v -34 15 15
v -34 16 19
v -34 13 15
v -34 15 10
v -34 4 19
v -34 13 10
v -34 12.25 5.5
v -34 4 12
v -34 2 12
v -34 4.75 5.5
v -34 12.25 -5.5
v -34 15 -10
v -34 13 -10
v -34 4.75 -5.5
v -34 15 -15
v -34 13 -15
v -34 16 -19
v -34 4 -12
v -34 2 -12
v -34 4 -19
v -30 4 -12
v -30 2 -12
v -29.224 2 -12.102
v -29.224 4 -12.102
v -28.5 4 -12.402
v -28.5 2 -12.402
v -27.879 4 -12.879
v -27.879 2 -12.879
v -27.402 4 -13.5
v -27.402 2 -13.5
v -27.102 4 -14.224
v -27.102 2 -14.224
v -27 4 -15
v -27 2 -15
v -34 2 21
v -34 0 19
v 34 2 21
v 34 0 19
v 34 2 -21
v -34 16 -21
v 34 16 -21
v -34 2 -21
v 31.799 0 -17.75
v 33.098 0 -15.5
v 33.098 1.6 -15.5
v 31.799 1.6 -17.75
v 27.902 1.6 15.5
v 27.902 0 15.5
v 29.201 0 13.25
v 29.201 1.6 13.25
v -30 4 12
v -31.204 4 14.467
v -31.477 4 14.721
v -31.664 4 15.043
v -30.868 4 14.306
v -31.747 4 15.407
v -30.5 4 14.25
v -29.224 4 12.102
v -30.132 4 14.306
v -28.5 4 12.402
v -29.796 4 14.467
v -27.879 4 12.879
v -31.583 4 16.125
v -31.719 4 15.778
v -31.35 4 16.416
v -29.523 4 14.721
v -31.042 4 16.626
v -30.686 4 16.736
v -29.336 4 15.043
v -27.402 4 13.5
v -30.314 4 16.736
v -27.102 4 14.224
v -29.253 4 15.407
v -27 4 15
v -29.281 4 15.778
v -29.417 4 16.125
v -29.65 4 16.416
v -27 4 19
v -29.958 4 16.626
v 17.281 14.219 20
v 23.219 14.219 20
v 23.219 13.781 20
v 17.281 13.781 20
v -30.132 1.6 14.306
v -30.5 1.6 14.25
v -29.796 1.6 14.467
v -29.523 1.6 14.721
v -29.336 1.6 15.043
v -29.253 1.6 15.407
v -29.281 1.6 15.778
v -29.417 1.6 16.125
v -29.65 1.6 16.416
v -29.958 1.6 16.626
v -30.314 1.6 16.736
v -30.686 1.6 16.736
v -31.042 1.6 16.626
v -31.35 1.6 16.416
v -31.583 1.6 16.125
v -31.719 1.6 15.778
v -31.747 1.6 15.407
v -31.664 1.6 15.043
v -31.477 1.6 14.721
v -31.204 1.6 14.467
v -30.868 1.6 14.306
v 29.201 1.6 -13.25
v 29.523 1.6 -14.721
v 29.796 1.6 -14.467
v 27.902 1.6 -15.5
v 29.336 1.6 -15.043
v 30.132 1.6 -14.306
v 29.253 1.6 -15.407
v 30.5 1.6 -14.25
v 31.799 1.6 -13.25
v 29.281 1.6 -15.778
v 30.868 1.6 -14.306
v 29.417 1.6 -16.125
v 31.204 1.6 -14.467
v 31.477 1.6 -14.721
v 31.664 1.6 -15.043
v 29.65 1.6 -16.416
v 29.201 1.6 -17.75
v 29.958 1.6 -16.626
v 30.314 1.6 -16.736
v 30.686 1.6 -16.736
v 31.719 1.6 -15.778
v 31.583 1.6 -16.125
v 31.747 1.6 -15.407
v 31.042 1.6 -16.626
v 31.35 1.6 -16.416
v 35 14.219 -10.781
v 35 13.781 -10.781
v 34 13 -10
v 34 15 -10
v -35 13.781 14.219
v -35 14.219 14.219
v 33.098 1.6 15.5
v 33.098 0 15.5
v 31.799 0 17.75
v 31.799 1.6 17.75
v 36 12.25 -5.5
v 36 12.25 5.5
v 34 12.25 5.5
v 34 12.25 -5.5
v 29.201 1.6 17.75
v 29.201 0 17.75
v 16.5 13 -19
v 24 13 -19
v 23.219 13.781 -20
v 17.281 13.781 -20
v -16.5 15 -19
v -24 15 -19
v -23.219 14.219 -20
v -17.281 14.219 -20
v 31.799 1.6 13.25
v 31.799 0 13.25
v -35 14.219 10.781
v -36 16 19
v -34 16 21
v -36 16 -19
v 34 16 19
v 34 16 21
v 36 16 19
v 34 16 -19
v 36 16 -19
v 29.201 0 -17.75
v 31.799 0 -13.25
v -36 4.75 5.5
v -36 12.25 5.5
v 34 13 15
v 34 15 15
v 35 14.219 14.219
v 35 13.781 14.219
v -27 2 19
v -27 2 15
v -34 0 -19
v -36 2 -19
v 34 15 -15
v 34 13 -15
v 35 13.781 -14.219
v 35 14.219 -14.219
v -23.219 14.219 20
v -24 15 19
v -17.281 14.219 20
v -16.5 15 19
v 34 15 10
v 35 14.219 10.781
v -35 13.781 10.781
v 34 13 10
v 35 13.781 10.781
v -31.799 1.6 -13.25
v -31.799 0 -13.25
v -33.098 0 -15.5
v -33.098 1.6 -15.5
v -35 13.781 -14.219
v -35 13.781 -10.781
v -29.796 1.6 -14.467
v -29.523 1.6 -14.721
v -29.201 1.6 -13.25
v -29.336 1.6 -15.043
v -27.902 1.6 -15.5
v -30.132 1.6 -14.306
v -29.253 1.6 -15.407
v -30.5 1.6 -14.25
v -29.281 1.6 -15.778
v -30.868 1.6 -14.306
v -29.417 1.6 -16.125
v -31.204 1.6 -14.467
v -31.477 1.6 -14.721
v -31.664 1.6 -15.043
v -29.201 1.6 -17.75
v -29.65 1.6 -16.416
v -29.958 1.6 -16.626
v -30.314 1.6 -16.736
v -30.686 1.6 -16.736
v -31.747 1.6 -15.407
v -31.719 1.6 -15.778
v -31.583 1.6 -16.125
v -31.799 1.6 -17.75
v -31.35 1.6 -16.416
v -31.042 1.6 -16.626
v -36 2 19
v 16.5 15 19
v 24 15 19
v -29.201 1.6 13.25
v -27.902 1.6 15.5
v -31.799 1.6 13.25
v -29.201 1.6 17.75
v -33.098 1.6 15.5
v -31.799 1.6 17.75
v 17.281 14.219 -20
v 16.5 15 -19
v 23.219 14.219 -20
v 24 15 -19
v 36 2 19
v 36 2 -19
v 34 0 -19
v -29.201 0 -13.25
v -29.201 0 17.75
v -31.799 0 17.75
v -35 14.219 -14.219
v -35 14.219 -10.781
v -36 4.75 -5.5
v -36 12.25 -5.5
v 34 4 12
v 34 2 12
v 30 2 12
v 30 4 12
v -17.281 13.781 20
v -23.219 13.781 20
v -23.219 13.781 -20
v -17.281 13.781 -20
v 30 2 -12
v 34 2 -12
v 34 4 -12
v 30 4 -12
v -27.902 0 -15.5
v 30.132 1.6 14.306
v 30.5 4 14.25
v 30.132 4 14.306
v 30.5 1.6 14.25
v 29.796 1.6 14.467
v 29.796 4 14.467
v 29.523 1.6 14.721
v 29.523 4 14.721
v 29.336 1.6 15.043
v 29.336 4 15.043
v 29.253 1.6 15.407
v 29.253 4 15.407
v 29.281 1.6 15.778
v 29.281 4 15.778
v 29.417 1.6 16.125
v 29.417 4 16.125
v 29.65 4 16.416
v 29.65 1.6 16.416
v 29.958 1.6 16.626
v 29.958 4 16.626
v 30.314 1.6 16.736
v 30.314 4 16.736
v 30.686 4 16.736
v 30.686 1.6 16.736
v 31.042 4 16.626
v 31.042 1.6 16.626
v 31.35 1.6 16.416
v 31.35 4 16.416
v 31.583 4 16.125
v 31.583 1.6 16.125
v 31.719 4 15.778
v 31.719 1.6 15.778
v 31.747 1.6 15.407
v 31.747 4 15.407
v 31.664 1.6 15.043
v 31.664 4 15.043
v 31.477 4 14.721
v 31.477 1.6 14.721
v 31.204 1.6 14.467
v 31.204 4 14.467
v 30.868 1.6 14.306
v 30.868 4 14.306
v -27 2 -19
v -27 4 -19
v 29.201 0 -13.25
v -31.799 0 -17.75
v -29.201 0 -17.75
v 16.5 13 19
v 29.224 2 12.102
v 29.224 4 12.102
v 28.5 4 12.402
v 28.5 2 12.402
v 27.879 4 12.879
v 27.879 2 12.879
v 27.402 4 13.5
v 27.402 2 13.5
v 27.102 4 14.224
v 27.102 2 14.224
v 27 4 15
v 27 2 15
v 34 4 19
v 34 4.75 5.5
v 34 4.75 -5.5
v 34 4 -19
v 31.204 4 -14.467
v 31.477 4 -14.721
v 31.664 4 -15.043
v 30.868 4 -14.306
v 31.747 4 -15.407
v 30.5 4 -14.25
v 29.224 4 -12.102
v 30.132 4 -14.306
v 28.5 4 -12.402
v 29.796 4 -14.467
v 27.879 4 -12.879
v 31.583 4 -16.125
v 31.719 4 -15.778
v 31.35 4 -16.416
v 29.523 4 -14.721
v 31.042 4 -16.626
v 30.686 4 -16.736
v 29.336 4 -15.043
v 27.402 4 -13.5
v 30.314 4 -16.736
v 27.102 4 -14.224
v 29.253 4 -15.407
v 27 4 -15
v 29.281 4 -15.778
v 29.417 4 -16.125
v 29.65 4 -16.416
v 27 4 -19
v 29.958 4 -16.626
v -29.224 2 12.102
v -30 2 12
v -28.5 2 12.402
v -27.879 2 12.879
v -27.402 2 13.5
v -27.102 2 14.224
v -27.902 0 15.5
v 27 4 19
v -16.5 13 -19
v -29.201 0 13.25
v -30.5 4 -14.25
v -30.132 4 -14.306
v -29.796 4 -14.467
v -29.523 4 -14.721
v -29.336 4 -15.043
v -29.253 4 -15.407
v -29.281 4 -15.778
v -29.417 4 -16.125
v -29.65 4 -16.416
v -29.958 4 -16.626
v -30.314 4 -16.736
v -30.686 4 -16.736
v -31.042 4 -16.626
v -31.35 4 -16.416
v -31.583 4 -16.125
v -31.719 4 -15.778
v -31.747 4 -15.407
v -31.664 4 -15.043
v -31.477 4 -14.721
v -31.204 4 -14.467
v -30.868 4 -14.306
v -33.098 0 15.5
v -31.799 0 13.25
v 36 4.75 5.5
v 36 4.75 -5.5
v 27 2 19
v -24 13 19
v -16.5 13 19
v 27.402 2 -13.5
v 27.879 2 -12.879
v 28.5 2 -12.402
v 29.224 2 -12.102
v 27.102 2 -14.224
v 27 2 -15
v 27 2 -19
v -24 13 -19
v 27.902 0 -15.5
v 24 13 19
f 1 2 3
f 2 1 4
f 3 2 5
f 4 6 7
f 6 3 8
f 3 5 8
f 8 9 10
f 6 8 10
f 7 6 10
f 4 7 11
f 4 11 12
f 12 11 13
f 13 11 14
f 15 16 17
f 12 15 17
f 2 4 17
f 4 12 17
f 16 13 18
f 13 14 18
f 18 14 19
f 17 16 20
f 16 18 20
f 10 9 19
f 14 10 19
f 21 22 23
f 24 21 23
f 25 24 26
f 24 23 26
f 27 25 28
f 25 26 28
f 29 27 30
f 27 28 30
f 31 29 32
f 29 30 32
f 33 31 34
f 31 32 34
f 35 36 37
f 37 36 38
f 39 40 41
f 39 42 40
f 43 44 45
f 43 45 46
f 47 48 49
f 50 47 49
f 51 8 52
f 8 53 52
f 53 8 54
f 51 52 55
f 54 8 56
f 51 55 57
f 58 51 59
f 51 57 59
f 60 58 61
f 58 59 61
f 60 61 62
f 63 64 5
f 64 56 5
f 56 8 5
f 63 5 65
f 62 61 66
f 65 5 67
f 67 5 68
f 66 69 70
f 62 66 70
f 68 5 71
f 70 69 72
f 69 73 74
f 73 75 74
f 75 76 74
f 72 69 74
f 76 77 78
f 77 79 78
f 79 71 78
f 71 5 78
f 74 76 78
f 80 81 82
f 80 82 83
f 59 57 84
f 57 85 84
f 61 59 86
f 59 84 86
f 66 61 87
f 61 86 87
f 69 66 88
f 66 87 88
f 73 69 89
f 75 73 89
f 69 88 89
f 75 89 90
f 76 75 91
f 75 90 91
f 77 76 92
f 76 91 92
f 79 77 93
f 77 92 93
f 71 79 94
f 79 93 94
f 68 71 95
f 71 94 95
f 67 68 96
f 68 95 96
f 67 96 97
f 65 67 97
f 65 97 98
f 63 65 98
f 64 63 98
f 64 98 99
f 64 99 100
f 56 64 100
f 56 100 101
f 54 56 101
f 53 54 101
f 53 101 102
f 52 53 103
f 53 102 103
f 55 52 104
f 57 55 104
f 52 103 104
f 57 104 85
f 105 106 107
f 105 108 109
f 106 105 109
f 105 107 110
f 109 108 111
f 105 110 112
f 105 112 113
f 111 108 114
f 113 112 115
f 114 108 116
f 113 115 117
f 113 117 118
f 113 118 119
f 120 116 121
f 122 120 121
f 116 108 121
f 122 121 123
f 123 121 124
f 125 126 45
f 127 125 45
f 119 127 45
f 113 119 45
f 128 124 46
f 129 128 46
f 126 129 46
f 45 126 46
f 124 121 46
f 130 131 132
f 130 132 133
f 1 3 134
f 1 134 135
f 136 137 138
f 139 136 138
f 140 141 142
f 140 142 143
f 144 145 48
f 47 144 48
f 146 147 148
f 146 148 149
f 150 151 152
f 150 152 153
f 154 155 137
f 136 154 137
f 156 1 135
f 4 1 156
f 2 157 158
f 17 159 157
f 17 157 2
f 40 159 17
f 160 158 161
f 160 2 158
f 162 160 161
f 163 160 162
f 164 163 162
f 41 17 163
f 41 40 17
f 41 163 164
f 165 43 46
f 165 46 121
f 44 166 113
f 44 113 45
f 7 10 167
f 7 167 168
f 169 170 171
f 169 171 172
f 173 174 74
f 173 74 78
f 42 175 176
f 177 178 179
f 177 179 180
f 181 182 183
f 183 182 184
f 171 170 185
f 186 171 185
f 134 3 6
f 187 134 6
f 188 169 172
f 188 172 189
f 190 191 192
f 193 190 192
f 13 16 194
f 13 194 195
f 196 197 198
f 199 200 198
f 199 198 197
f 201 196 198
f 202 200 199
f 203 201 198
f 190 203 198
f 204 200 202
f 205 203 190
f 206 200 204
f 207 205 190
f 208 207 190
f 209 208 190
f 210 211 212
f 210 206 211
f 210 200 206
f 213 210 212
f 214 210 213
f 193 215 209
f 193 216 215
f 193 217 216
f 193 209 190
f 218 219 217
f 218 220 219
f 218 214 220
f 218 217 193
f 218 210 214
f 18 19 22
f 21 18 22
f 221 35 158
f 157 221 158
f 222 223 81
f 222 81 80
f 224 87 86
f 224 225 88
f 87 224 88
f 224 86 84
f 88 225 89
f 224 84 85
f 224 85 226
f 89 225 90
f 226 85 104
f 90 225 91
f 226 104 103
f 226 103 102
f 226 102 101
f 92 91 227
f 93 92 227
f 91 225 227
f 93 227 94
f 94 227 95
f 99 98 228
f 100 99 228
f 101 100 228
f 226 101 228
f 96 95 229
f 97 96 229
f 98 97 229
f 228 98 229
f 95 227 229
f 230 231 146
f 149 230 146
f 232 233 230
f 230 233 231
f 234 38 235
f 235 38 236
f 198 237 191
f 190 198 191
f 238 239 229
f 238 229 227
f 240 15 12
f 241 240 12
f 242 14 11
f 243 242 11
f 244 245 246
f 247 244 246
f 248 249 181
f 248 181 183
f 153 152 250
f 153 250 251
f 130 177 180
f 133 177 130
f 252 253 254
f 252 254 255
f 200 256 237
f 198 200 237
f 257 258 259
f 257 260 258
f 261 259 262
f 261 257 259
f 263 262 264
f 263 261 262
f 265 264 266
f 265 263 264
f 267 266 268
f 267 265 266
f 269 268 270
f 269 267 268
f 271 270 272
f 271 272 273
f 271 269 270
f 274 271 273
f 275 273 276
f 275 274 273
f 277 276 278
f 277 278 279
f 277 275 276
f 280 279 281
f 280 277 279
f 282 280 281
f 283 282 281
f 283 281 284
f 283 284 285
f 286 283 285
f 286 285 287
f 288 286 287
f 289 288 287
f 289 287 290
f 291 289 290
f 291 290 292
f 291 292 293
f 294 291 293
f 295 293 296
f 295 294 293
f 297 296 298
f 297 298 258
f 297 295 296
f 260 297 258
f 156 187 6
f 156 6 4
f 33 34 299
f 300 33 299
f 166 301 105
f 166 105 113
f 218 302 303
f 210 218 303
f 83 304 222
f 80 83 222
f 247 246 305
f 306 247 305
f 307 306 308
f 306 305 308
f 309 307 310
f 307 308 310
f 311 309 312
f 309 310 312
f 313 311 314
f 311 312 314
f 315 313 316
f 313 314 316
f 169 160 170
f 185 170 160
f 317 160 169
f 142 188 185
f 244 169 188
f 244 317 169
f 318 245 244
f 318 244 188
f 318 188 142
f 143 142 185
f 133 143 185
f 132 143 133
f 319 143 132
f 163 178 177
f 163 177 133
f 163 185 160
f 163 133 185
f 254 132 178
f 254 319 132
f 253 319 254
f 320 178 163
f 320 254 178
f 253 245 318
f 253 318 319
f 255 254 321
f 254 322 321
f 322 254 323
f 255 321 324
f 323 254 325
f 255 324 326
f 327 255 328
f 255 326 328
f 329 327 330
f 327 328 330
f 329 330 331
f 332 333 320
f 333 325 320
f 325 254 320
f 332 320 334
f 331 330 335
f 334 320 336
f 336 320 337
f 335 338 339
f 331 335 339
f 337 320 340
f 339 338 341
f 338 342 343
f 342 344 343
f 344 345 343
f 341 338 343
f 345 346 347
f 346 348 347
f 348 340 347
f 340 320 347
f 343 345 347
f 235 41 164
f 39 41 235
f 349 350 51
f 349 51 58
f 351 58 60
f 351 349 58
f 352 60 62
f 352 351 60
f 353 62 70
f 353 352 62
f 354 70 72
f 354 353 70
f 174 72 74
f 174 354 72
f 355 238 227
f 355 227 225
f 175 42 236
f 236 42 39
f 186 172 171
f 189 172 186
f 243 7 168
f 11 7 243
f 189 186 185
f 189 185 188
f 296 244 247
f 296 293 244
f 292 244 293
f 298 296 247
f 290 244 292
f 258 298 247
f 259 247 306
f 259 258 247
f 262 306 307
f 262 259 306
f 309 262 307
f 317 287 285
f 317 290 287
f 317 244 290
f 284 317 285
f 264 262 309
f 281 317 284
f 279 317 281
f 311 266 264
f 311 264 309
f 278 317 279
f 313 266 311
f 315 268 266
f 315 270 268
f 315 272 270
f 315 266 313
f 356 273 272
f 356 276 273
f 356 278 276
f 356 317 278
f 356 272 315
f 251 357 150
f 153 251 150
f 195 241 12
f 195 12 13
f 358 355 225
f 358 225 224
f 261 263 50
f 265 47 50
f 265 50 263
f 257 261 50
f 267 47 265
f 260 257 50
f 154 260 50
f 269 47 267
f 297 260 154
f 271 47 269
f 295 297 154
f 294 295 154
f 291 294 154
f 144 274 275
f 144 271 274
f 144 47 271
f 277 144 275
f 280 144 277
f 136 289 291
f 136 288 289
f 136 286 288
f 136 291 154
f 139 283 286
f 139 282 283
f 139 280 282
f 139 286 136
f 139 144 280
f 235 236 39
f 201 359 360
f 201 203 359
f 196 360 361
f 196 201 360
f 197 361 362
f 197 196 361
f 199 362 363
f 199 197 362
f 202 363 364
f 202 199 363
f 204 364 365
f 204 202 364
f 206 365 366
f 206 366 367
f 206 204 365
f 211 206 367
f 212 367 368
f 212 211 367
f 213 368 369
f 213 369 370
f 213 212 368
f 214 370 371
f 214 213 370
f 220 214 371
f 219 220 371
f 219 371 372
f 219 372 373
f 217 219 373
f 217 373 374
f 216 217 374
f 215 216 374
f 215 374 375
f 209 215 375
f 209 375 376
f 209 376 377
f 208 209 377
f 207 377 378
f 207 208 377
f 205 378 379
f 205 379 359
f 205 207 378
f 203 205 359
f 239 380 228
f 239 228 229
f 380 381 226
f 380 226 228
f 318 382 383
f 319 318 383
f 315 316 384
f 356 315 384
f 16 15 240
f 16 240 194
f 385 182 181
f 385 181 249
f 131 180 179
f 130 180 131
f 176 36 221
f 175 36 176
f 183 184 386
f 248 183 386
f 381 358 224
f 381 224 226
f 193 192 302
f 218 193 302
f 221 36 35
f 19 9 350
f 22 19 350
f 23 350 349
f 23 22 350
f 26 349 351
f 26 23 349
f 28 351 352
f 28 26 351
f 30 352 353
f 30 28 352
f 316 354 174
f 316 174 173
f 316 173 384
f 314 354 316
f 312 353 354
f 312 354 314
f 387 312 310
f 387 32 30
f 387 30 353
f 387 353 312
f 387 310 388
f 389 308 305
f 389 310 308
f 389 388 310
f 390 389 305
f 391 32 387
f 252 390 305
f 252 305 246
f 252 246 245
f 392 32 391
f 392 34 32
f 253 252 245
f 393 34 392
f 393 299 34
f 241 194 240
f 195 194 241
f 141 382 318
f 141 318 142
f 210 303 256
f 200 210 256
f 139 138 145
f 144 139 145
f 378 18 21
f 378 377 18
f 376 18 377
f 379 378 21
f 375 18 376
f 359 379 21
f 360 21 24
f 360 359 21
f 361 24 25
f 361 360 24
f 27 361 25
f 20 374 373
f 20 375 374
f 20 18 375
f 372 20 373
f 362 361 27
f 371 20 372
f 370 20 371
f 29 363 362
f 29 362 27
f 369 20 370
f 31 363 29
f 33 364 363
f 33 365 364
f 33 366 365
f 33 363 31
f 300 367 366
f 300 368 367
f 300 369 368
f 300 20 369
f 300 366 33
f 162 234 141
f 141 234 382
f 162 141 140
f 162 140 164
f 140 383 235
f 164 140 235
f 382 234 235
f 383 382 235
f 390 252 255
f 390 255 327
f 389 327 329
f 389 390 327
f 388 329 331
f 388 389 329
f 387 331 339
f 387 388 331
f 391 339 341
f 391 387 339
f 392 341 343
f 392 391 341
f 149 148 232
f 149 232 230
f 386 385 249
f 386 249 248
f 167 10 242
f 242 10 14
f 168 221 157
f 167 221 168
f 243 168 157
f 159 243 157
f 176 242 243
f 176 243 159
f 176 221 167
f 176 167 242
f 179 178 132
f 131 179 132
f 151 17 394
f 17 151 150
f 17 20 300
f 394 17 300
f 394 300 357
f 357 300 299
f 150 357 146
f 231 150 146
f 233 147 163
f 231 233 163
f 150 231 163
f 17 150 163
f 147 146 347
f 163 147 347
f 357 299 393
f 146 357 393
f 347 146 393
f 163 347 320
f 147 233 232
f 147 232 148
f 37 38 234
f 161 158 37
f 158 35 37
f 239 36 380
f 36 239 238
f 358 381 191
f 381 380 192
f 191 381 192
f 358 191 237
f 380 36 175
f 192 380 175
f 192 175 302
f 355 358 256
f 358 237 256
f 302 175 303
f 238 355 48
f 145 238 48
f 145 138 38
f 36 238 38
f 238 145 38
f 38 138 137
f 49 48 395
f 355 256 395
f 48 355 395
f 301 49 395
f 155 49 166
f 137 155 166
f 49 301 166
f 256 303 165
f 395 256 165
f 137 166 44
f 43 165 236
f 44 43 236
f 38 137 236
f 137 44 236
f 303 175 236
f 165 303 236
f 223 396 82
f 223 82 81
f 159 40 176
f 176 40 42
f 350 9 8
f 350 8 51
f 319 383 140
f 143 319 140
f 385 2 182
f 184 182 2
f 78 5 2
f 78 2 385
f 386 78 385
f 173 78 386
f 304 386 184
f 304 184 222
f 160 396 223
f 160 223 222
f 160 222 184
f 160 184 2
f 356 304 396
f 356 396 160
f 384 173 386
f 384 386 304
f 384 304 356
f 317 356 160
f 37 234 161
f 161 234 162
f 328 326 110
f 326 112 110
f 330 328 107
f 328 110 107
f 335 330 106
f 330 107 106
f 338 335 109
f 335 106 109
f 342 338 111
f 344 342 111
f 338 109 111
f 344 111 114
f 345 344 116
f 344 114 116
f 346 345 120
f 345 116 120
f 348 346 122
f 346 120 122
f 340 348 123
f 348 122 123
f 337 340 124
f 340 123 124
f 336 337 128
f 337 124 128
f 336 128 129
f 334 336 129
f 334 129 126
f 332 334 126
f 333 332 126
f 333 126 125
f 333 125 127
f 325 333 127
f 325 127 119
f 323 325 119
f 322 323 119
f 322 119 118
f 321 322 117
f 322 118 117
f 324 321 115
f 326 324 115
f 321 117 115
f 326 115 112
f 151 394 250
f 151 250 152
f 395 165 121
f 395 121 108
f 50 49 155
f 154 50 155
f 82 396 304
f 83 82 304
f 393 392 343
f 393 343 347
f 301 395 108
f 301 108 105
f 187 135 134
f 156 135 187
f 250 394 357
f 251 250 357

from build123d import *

# Parameters (mm, degrees)
SKETCH1_W               = 72
SKETCH1_H               = 42
SKETCH1_W_2             = 68
SKETCH1_H_2             = 38
BOSS_EXTRUDE1_DEPTH     = 2
BOSS_EXTRUDE2_START     = 2
SKETCH1_3_W             = 72
SKETCH1_3_H             = 42
SKETCH1_3_W_2           = 68
SKETCH1_3_H_2           = 38
BOSS_EXTRUDE2_DEPTH     = 14
CHAMFER1_SIZE           = 2
SKETCH2_R               = 1.25
BOSS_EXTRUDE3_DEPTH     = 2
MIRROR2_COPY_1_SKETCH_R = 1.25
MIRROR2_COPY_1_DEPTH    = 2
CUT_EXTRUDE1_DEPTH      = 1.6
MIRROR4_COPY_1_DEPTH    = 1.6
CUT_EXTRUDE2_DEPTH      = 44.965895874
CUT_EXTRUDE2_DEPTH_BACK = 44.965895874
SKETCH4_R               = 1.25
SKETCH5_W               = 7.5
SKETCH5_H               = 2
CUT_EXTRUDE3_DEPTH      = 1
CUT_EXTRUDE3_DRAFT      = -38
MIRROR5_COPY_1_SKETCH_W = 7.5
MIRROR5_COPY_1_SKETCH_H = 2
MIRROR5_COPY_1_DEPTH    = 1
MIRROR5_COPY_1_DRAFT    = -38
MIRROR8_COPY_1_SKETCH_W = 7.5
MIRROR8_COPY_1_SKETCH_H = 2
MIRROR8_COPY_1_DEPTH    = 1
MIRROR8_COPY_1_DRAFT    = -38
MIRROR8_COPY_2_SKETCH_W = 7.5
MIRROR8_COPY_2_SKETCH_H = 2
MIRROR8_COPY_2_DEPTH    = 1
MIRROR8_COPY_2_DRAFT    = -38
SKETCH6_W               = 5
SKETCH6_H               = 2
CUT_EXTRUDE4_DEPTH      = 1
CUT_EXTRUDE4_DRAFT      = -38
MIRROR6_COPY_1_SKETCH_W = 5
MIRROR6_COPY_1_SKETCH_H = 2
MIRROR6_COPY_1_DEPTH    = 1
MIRROR6_COPY_1_DRAFT    = -38
MIRROR7_COPY_1_SKETCH_W = 5
MIRROR7_COPY_1_SKETCH_H = 2
MIRROR7_COPY_1_DEPTH    = 1
MIRROR7_COPY_1_DRAFT    = -38
MIRROR7_COPY_2_SKETCH_W = 5
MIRROR7_COPY_2_SKETCH_H = 2
MIRROR7_COPY_2_DEPTH    = 1
MIRROR7_COPY_2_DRAFT    = -38
SKETCH7_W               = 11
SKETCH7_H               = 7.5
CUT_EXTRUDE5_DEPTH      = 77.68767828


with BuildPart() as part:
    # Sketch1 → Boss-Extrude1 (new body)
    # profile 1 of 2: a face of its own
    with BuildSketch(Plane(origin=(0, 0, 0), x_dir=(1, 0, 0), z_dir=(0, 1, 0))):
        Rectangle(SKETCH1_W, SKETCH1_H)
        Rectangle(SKETCH1_W_2, SKETCH1_H_2, mode=Mode.SUBTRACT)
    # profile 2 of 2: a face of its own
    with BuildSketch(Plane(origin=(0, 0, 0), x_dir=(1, 0, 0), z_dir=(0, 1, 0))):
        Rectangle(SKETCH1_W_2, SKETCH1_H_2)
    extrude(amount=BOSS_EXTRUDE1_DEPTH)

    # Sketch1<3> → Boss-Extrude2 (add)
    with BuildSketch(Plane(origin=(0, 0, 0), x_dir=(1, 0, 0), z_dir=(0, 1, 0)).offset(BOSS_EXTRUDE2_START)):
        Rectangle(SKETCH1_3_W, SKETCH1_3_H)
        Rectangle(SKETCH1_3_W_2, SKETCH1_3_H_2, mode=Mode.SUBTRACT)
    extrude(amount=BOSS_EXTRUDE2_DEPTH)

    # Chamfer1
    chamfer1_edges = [part.edges().sort_by_distance(p)[0] for p in [
        (0, 0, -21),
        (36, 0, 0),
        (0, 0, 21),
        (-36, 0, 0),
        (-36, 8, -21),
        (36, 8, -21),
        (36, 8, 21),
        (-36, 8, 21),
    ]]
    chamfer(chamfer1_edges, length=CHAMFER1_SIZE)

    # Sketch2 → Boss-Extrude3 (add)
    with BuildSketch(Plane(origin=(0, 2, 0), x_dir=(1, 0, 0), z_dir=(0, 1, 0))):
        with BuildLine():
            Line((-34, 12), (-30, 12))
            ThreePointArc((-30, 12), (-27.878679656, 12.878679656), (-27, 15))
            Line((-27, 15), (-27, 19))
            Line((-27, 19), (-34, 19))
            Line((-34, 19), (-34, 12))
        make_face()
        with Locations(Location((-30.5, 15.5, 0), (0, 0, 270))):
            Circle(SKETCH2_R, mode=Mode.SUBTRACT)
    boss_extrude3 = extrude(amount=BOSS_EXTRUDE3_DEPTH)

    # Mirror1: Boss-Extrude3 across plane
    add(boss_extrude3.mirror(Plane.XY))

    # Mirror2: Boss-Extrude3 across plane
    add(boss_extrude3.mirror(Plane(origin=(0, 0, 0), x_dir=(0, 0, 1), z_dir=(1, 0, 0))))

    # Mirror2 copy 1 sketch → Mirror2 copy 1 (add)
    with BuildSketch(Plane(origin=(0, 2, 0), x_dir=(-1, 0, 0), z_dir=(0, 1, 0))):
        with BuildLine():
            Line((-34, 12), (-30, 12))
            ThreePointArc((-30, 12), (-27.878679656, 12.878679656), (-27, 15))
            Line((-27, 15), (-27, 19))
            Line((-27, 19), (-34, 19))
            Line((-34, 19), (-34, 12))
        make_face()
        with Locations(Location((-30.5, 15.5, 0), (0, 0, 270))):
            Circle(MIRROR2_COPY_1_SKETCH_R, mode=Mode.SUBTRACT)
    extrude(amount=MIRROR2_COPY_1_DEPTH)

    # Sketch3 → Cut-Extrude1 (cut)
    with BuildSketch(Plane.XZ):
        Polygon((-31.799038106, 17.75), (-29.200961894, 17.75), (-27.901923789, 15.5), (-29.200961894, 13.25), (-31.799038106, 13.25), (-33.098076211, 15.5), align=None)
    cut_extrude1 = extrude(amount=-CUT_EXTRUDE1_DEPTH, mode=Mode.SUBTRACT)

    # Mirror3: Cut-Extrude1 across plane
    add(cut_extrude1.mirror(Plane.XY), mode=Mode.SUBTRACT)

    # Mirror4: Cut-Extrude1 across plane
    add(cut_extrude1.mirror(Plane(origin=(0, 0, 0), x_dir=(0, 0, 1), z_dir=(1, 0, 0))), mode=Mode.SUBTRACT)

    # Mirror4 copy 1 sketch → Mirror4 copy 1 (cut)
    with BuildSketch(Plane(origin=(0, 0, 0), x_dir=(-1, 0, 0), z_dir=(0, -1, 0))):
        Polygon((-31.799038106, 17.75), (-29.200961894, 17.75), (-27.901923789, 15.5), (-29.200961894, 13.25), (-31.799038106, 13.25), (-33.098076211, 15.5), align=None)
    extrude(amount=-MIRROR4_COPY_1_DEPTH, mode=Mode.SUBTRACT)

    # Sketch4 → Cut-Extrude2 (cut, two sides: drawn at the far end of the back side and taken through both)
    with BuildSketch(Plane(origin=(0, 2, 0), x_dir=(1, 0, 0), z_dir=(0, 1, 0)).offset(-CUT_EXTRUDE2_DEPTH_BACK)):
        with Locations(Location((30.5, -15.5, 0), (0, 0, 90))):
            Circle(SKETCH4_R)
        with Locations(Location((30.5, 15.5, 0), (0, 0, 270))):
            Circle(SKETCH4_R)
        with Locations(Location((-30.5, 15.5, 0), (0, 0, 270))):
            Circle(SKETCH4_R)
        with Locations(Location((-30.5, -15.5, 0), (0, 0, 90))):
            Circle(SKETCH4_R)
    extrude(amount=CUT_EXTRUDE2_DEPTH + CUT_EXTRUDE2_DEPTH_BACK, mode=Mode.SUBTRACT)


with BuildPart() as cut_extrude3_tool:
    # Sketch5 → Cut-Extrude3 (with draft: the straight prism first)
    with BuildSketch(Plane(origin=(0, 0, 19), x_dir=(-1, 0, 0), z_dir=(0, 0, -1))):
        with Locations((-20.25, 14)):
            Rectangle(SKETCH5_W, SKETCH5_H)
    extrude(amount=-CUT_EXTRUDE3_DEPTH)
    # Cut-Extrude3: the draft: its side faces are tilted about the plane it starts from
    cut_extrude3_sides = [cut_extrude3_tool.faces().sort_by_distance(p)[0] for p in [
        (24, 14, 19.5),
        (20.25, 13, 19.5),
        (16.5, 14, 19.5),
        (20.25, 15, 19.5),
    ]]
    draft(cut_extrude3_sides, Plane(origin=(0, 0, 19), x_dir=(-1, 0, 0), z_dir=(0, 0, -1)), CUT_EXTRUDE3_DRAFT)


with BuildPart() as part_1:
    add(part.part)

    # Cut-Extrude3: cut by cut_extrude3_tool
    add(cut_extrude3_tool.part, mode=Mode.SUBTRACT)


with BuildPart() as mirror5_copy_1_tool:
    # Mirror5 copy 1 sketch → Mirror5 copy 1 (with draft: the straight prism first)
    with BuildSketch(Plane(origin=(0, 0, -19), x_dir=(-1, 0, 0), z_dir=(0, 0, 1))):
        with Locations((-20.25, -14)):
            Rectangle(MIRROR5_COPY_1_SKETCH_W, MIRROR5_COPY_1_SKETCH_H)
    extrude(amount=-MIRROR5_COPY_1_DEPTH)
    # Mirror5 copy 1: the draft: its side faces are tilted about the plane it starts from
    mirror5_copy_1_sides = [mirror5_copy_1_tool.faces().sort_by_distance(p)[0] for p in [
        (24, 14, -19.5),
        (20.25, 13, -19.5),
        (16.5, 14, -19.5),
        (20.25, 15, -19.5),
    ]]
    draft(mirror5_copy_1_sides, Plane(origin=(0, 0, -19), x_dir=(-1, 0, 0), z_dir=(0, 0, 1)), MIRROR5_COPY_1_DRAFT)


with BuildPart() as part_2:
    add(part_1.part)

    # Mirror5 copy 1: cut by mirror5_copy_1_tool
    add(mirror5_copy_1_tool.part, mode=Mode.SUBTRACT)


with BuildPart() as mirror8_copy_1_tool:
    # Mirror8 copy 1 sketch → Mirror8 copy 1 (with draft: the straight prism first)
    with BuildSketch(Plane(origin=(0, 0, 19), x_dir=(1, 0, 0), z_dir=(0, 0, -1))):
        with Locations((-20.25, -14)):
            Rectangle(MIRROR8_COPY_1_SKETCH_W, MIRROR8_COPY_1_SKETCH_H)
    extrude(amount=-MIRROR8_COPY_1_DEPTH)
    # Mirror8 copy 1: the draft: its side faces are tilted about the plane it starts from
    mirror8_copy_1_sides = [mirror8_copy_1_tool.faces().sort_by_distance(p)[0] for p in [
        (-24, 14, 19.5),
        (-20.25, 13, 19.5),
        (-16.5, 14, 19.5),
        (-20.25, 15, 19.5),
    ]]
    draft(mirror8_copy_1_sides, Plane(origin=(0, 0, 19), x_dir=(1, 0, 0), z_dir=(0, 0, -1)), MIRROR8_COPY_1_DRAFT)


with BuildPart() as part_3:
    add(part_2.part)

    # Mirror8 copy 1: cut by mirror8_copy_1_tool
    add(mirror8_copy_1_tool.part, mode=Mode.SUBTRACT)


with BuildPart() as mirror8_copy_2_tool:
    # Mirror8 copy 2 sketch → Mirror8 copy 2 (with draft: the straight prism first)
    with BuildSketch(Plane.XY.offset(-19)):
        with Locations((-20.25, 14)):
            Rectangle(MIRROR8_COPY_2_SKETCH_W, MIRROR8_COPY_2_SKETCH_H)
    extrude(amount=-MIRROR8_COPY_2_DEPTH)
    # Mirror8 copy 2: the draft: its side faces are tilted about the plane it starts from
    mirror8_copy_2_sides = [mirror8_copy_2_tool.faces().sort_by_distance(p)[0] for p in [
        (-24, 14, -19.5),
        (-20.25, 13, -19.5),
        (-16.5, 14, -19.5),
        (-20.25, 15, -19.5),
    ]]
    draft(mirror8_copy_2_sides, Plane.XY.offset(-19), MIRROR8_COPY_2_DRAFT)


with BuildPart() as part_4:
    add(part_3.part)

    # Mirror8 copy 2: cut by mirror8_copy_2_tool
    add(mirror8_copy_2_tool.part, mode=Mode.SUBTRACT)


with BuildPart() as cut_extrude4_tool:
    # Sketch6 → Cut-Extrude4 (with draft: the straight prism first)
    with BuildSketch(Plane(origin=(-34, 0, 0), x_dir=(0, 0, -1), z_dir=(1, 0, 0))):
        with Locations((-12.5, 14)):
            Rectangle(SKETCH6_W, SKETCH6_H)
    extrude(amount=-CUT_EXTRUDE4_DEPTH)
    # Cut-Extrude4: the draft: its side faces are tilted about the plane it starts from
    cut_extrude4_sides = [cut_extrude4_tool.faces().sort_by_distance(p)[0] for p in [
        (-34.5, 14, 15),
        (-34.5, 13, 12.5),
        (-34.5, 14, 10),
        (-34.5, 15, 12.5),
    ]]
    draft(cut_extrude4_sides, Plane(origin=(-34, 0, 0), x_dir=(0, 0, -1), z_dir=(1, 0, 0)), CUT_EXTRUDE4_DRAFT)


with BuildPart() as part_5:
    add(part_4.part)

    # Cut-Extrude4: cut by cut_extrude4_tool
    add(cut_extrude4_tool.part, mode=Mode.SUBTRACT)


with BuildPart() as mirror6_copy_1_tool:
    # Mirror6 copy 1 sketch → Mirror6 copy 1 (with draft: the straight prism first)
    with BuildSketch(Plane(origin=(34, 0, 0), x_dir=(0, 0, -1), z_dir=(-1, 0, 0))):
        with Locations((-12.5, -14)):
            Rectangle(MIRROR6_COPY_1_SKETCH_W, MIRROR6_COPY_1_SKETCH_H)
    extrude(amount=-MIRROR6_COPY_1_DEPTH)
    # Mirror6 copy 1: the draft: its side faces are tilted about the plane it starts from
    mirror6_copy_1_sides = [mirror6_copy_1_tool.faces().sort_by_distance(p)[0] for p in [
        (34.5, 14, 15),
        (34.5, 13, 12.5),
        (34.5, 14, 10),
        (34.5, 15, 12.5),
    ]]
    draft(mirror6_copy_1_sides, Plane(origin=(34, 0, 0), x_dir=(0, 0, -1), z_dir=(-1, 0, 0)), MIRROR6_COPY_1_DRAFT)


with BuildPart() as part_6:
    add(part_5.part)

    # Mirror6 copy 1: cut by mirror6_copy_1_tool
    add(mirror6_copy_1_tool.part, mode=Mode.SUBTRACT)


with BuildPart() as mirror7_copy_1_tool:
    # Mirror7 copy 1 sketch → Mirror7 copy 1 (with draft: the straight prism first)
    with BuildSketch(Plane(origin=(-34, 0, 0), x_dir=(0, 0, 1), z_dir=(1, 0, 0))):
        with Locations((-12.5, -14)):
            Rectangle(MIRROR7_COPY_1_SKETCH_W, MIRROR7_COPY_1_SKETCH_H)
    extrude(amount=-MIRROR7_COPY_1_DEPTH)
    # Mirror7 copy 1: the draft: its side faces are tilted about the plane it starts from
    mirror7_copy_1_sides = [mirror7_copy_1_tool.faces().sort_by_distance(p)[0] for p in [
        (-34.5, 14, -15),
        (-34.5, 13, -12.5),
        (-34.5, 14, -10),
        (-34.5, 15, -12.5),
    ]]
    draft(mirror7_copy_1_sides, Plane(origin=(-34, 0, 0), x_dir=(0, 0, 1), z_dir=(1, 0, 0)), MIRROR7_COPY_1_DRAFT)


with BuildPart() as part_7:
    add(part_6.part)

    # Mirror7 copy 1: cut by mirror7_copy_1_tool
    add(mirror7_copy_1_tool.part, mode=Mode.SUBTRACT)


with BuildPart() as mirror7_copy_2_tool:
    # Mirror7 copy 2 sketch → Mirror7 copy 2 (with draft: the straight prism first)
    with BuildSketch(Plane.ZY.offset(-34)):
        with Locations((-12.5, 14)):
            Rectangle(MIRROR7_COPY_2_SKETCH_W, MIRROR7_COPY_2_SKETCH_H)
    extrude(amount=-MIRROR7_COPY_2_DEPTH)
    # Mirror7 copy 2: the draft: its side faces are tilted about the plane it starts from
    mirror7_copy_2_sides = [mirror7_copy_2_tool.faces().sort_by_distance(p)[0] for p in [
        (34.5, 14, -15),
        (34.5, 13, -12.5),
        (34.5, 14, -10),
        (34.5, 15, -12.5),
    ]]
    draft(mirror7_copy_2_sides, Plane.ZY.offset(-34), MIRROR7_COPY_2_DRAFT)


with BuildPart() as part_8:
    add(part_7.part)

    # Mirror7 copy 2: cut by mirror7_copy_2_tool
    add(mirror7_copy_2_tool.part, mode=Mode.SUBTRACT)

    # Sketch7 → Cut-Extrude5 (cut, through all)
    with BuildSketch(Plane(origin=(36, 0, 0), x_dir=(0, 0, -1), z_dir=(1, 0, 0))):
        with Locations((0, 8.5)):
            Rectangle(SKETCH7_W, SKETCH7_H)
    extrude(amount=-CUT_EXTRUDE5_DEPTH, mode=Mode.SUBTRACT)


solid = part_8.part
